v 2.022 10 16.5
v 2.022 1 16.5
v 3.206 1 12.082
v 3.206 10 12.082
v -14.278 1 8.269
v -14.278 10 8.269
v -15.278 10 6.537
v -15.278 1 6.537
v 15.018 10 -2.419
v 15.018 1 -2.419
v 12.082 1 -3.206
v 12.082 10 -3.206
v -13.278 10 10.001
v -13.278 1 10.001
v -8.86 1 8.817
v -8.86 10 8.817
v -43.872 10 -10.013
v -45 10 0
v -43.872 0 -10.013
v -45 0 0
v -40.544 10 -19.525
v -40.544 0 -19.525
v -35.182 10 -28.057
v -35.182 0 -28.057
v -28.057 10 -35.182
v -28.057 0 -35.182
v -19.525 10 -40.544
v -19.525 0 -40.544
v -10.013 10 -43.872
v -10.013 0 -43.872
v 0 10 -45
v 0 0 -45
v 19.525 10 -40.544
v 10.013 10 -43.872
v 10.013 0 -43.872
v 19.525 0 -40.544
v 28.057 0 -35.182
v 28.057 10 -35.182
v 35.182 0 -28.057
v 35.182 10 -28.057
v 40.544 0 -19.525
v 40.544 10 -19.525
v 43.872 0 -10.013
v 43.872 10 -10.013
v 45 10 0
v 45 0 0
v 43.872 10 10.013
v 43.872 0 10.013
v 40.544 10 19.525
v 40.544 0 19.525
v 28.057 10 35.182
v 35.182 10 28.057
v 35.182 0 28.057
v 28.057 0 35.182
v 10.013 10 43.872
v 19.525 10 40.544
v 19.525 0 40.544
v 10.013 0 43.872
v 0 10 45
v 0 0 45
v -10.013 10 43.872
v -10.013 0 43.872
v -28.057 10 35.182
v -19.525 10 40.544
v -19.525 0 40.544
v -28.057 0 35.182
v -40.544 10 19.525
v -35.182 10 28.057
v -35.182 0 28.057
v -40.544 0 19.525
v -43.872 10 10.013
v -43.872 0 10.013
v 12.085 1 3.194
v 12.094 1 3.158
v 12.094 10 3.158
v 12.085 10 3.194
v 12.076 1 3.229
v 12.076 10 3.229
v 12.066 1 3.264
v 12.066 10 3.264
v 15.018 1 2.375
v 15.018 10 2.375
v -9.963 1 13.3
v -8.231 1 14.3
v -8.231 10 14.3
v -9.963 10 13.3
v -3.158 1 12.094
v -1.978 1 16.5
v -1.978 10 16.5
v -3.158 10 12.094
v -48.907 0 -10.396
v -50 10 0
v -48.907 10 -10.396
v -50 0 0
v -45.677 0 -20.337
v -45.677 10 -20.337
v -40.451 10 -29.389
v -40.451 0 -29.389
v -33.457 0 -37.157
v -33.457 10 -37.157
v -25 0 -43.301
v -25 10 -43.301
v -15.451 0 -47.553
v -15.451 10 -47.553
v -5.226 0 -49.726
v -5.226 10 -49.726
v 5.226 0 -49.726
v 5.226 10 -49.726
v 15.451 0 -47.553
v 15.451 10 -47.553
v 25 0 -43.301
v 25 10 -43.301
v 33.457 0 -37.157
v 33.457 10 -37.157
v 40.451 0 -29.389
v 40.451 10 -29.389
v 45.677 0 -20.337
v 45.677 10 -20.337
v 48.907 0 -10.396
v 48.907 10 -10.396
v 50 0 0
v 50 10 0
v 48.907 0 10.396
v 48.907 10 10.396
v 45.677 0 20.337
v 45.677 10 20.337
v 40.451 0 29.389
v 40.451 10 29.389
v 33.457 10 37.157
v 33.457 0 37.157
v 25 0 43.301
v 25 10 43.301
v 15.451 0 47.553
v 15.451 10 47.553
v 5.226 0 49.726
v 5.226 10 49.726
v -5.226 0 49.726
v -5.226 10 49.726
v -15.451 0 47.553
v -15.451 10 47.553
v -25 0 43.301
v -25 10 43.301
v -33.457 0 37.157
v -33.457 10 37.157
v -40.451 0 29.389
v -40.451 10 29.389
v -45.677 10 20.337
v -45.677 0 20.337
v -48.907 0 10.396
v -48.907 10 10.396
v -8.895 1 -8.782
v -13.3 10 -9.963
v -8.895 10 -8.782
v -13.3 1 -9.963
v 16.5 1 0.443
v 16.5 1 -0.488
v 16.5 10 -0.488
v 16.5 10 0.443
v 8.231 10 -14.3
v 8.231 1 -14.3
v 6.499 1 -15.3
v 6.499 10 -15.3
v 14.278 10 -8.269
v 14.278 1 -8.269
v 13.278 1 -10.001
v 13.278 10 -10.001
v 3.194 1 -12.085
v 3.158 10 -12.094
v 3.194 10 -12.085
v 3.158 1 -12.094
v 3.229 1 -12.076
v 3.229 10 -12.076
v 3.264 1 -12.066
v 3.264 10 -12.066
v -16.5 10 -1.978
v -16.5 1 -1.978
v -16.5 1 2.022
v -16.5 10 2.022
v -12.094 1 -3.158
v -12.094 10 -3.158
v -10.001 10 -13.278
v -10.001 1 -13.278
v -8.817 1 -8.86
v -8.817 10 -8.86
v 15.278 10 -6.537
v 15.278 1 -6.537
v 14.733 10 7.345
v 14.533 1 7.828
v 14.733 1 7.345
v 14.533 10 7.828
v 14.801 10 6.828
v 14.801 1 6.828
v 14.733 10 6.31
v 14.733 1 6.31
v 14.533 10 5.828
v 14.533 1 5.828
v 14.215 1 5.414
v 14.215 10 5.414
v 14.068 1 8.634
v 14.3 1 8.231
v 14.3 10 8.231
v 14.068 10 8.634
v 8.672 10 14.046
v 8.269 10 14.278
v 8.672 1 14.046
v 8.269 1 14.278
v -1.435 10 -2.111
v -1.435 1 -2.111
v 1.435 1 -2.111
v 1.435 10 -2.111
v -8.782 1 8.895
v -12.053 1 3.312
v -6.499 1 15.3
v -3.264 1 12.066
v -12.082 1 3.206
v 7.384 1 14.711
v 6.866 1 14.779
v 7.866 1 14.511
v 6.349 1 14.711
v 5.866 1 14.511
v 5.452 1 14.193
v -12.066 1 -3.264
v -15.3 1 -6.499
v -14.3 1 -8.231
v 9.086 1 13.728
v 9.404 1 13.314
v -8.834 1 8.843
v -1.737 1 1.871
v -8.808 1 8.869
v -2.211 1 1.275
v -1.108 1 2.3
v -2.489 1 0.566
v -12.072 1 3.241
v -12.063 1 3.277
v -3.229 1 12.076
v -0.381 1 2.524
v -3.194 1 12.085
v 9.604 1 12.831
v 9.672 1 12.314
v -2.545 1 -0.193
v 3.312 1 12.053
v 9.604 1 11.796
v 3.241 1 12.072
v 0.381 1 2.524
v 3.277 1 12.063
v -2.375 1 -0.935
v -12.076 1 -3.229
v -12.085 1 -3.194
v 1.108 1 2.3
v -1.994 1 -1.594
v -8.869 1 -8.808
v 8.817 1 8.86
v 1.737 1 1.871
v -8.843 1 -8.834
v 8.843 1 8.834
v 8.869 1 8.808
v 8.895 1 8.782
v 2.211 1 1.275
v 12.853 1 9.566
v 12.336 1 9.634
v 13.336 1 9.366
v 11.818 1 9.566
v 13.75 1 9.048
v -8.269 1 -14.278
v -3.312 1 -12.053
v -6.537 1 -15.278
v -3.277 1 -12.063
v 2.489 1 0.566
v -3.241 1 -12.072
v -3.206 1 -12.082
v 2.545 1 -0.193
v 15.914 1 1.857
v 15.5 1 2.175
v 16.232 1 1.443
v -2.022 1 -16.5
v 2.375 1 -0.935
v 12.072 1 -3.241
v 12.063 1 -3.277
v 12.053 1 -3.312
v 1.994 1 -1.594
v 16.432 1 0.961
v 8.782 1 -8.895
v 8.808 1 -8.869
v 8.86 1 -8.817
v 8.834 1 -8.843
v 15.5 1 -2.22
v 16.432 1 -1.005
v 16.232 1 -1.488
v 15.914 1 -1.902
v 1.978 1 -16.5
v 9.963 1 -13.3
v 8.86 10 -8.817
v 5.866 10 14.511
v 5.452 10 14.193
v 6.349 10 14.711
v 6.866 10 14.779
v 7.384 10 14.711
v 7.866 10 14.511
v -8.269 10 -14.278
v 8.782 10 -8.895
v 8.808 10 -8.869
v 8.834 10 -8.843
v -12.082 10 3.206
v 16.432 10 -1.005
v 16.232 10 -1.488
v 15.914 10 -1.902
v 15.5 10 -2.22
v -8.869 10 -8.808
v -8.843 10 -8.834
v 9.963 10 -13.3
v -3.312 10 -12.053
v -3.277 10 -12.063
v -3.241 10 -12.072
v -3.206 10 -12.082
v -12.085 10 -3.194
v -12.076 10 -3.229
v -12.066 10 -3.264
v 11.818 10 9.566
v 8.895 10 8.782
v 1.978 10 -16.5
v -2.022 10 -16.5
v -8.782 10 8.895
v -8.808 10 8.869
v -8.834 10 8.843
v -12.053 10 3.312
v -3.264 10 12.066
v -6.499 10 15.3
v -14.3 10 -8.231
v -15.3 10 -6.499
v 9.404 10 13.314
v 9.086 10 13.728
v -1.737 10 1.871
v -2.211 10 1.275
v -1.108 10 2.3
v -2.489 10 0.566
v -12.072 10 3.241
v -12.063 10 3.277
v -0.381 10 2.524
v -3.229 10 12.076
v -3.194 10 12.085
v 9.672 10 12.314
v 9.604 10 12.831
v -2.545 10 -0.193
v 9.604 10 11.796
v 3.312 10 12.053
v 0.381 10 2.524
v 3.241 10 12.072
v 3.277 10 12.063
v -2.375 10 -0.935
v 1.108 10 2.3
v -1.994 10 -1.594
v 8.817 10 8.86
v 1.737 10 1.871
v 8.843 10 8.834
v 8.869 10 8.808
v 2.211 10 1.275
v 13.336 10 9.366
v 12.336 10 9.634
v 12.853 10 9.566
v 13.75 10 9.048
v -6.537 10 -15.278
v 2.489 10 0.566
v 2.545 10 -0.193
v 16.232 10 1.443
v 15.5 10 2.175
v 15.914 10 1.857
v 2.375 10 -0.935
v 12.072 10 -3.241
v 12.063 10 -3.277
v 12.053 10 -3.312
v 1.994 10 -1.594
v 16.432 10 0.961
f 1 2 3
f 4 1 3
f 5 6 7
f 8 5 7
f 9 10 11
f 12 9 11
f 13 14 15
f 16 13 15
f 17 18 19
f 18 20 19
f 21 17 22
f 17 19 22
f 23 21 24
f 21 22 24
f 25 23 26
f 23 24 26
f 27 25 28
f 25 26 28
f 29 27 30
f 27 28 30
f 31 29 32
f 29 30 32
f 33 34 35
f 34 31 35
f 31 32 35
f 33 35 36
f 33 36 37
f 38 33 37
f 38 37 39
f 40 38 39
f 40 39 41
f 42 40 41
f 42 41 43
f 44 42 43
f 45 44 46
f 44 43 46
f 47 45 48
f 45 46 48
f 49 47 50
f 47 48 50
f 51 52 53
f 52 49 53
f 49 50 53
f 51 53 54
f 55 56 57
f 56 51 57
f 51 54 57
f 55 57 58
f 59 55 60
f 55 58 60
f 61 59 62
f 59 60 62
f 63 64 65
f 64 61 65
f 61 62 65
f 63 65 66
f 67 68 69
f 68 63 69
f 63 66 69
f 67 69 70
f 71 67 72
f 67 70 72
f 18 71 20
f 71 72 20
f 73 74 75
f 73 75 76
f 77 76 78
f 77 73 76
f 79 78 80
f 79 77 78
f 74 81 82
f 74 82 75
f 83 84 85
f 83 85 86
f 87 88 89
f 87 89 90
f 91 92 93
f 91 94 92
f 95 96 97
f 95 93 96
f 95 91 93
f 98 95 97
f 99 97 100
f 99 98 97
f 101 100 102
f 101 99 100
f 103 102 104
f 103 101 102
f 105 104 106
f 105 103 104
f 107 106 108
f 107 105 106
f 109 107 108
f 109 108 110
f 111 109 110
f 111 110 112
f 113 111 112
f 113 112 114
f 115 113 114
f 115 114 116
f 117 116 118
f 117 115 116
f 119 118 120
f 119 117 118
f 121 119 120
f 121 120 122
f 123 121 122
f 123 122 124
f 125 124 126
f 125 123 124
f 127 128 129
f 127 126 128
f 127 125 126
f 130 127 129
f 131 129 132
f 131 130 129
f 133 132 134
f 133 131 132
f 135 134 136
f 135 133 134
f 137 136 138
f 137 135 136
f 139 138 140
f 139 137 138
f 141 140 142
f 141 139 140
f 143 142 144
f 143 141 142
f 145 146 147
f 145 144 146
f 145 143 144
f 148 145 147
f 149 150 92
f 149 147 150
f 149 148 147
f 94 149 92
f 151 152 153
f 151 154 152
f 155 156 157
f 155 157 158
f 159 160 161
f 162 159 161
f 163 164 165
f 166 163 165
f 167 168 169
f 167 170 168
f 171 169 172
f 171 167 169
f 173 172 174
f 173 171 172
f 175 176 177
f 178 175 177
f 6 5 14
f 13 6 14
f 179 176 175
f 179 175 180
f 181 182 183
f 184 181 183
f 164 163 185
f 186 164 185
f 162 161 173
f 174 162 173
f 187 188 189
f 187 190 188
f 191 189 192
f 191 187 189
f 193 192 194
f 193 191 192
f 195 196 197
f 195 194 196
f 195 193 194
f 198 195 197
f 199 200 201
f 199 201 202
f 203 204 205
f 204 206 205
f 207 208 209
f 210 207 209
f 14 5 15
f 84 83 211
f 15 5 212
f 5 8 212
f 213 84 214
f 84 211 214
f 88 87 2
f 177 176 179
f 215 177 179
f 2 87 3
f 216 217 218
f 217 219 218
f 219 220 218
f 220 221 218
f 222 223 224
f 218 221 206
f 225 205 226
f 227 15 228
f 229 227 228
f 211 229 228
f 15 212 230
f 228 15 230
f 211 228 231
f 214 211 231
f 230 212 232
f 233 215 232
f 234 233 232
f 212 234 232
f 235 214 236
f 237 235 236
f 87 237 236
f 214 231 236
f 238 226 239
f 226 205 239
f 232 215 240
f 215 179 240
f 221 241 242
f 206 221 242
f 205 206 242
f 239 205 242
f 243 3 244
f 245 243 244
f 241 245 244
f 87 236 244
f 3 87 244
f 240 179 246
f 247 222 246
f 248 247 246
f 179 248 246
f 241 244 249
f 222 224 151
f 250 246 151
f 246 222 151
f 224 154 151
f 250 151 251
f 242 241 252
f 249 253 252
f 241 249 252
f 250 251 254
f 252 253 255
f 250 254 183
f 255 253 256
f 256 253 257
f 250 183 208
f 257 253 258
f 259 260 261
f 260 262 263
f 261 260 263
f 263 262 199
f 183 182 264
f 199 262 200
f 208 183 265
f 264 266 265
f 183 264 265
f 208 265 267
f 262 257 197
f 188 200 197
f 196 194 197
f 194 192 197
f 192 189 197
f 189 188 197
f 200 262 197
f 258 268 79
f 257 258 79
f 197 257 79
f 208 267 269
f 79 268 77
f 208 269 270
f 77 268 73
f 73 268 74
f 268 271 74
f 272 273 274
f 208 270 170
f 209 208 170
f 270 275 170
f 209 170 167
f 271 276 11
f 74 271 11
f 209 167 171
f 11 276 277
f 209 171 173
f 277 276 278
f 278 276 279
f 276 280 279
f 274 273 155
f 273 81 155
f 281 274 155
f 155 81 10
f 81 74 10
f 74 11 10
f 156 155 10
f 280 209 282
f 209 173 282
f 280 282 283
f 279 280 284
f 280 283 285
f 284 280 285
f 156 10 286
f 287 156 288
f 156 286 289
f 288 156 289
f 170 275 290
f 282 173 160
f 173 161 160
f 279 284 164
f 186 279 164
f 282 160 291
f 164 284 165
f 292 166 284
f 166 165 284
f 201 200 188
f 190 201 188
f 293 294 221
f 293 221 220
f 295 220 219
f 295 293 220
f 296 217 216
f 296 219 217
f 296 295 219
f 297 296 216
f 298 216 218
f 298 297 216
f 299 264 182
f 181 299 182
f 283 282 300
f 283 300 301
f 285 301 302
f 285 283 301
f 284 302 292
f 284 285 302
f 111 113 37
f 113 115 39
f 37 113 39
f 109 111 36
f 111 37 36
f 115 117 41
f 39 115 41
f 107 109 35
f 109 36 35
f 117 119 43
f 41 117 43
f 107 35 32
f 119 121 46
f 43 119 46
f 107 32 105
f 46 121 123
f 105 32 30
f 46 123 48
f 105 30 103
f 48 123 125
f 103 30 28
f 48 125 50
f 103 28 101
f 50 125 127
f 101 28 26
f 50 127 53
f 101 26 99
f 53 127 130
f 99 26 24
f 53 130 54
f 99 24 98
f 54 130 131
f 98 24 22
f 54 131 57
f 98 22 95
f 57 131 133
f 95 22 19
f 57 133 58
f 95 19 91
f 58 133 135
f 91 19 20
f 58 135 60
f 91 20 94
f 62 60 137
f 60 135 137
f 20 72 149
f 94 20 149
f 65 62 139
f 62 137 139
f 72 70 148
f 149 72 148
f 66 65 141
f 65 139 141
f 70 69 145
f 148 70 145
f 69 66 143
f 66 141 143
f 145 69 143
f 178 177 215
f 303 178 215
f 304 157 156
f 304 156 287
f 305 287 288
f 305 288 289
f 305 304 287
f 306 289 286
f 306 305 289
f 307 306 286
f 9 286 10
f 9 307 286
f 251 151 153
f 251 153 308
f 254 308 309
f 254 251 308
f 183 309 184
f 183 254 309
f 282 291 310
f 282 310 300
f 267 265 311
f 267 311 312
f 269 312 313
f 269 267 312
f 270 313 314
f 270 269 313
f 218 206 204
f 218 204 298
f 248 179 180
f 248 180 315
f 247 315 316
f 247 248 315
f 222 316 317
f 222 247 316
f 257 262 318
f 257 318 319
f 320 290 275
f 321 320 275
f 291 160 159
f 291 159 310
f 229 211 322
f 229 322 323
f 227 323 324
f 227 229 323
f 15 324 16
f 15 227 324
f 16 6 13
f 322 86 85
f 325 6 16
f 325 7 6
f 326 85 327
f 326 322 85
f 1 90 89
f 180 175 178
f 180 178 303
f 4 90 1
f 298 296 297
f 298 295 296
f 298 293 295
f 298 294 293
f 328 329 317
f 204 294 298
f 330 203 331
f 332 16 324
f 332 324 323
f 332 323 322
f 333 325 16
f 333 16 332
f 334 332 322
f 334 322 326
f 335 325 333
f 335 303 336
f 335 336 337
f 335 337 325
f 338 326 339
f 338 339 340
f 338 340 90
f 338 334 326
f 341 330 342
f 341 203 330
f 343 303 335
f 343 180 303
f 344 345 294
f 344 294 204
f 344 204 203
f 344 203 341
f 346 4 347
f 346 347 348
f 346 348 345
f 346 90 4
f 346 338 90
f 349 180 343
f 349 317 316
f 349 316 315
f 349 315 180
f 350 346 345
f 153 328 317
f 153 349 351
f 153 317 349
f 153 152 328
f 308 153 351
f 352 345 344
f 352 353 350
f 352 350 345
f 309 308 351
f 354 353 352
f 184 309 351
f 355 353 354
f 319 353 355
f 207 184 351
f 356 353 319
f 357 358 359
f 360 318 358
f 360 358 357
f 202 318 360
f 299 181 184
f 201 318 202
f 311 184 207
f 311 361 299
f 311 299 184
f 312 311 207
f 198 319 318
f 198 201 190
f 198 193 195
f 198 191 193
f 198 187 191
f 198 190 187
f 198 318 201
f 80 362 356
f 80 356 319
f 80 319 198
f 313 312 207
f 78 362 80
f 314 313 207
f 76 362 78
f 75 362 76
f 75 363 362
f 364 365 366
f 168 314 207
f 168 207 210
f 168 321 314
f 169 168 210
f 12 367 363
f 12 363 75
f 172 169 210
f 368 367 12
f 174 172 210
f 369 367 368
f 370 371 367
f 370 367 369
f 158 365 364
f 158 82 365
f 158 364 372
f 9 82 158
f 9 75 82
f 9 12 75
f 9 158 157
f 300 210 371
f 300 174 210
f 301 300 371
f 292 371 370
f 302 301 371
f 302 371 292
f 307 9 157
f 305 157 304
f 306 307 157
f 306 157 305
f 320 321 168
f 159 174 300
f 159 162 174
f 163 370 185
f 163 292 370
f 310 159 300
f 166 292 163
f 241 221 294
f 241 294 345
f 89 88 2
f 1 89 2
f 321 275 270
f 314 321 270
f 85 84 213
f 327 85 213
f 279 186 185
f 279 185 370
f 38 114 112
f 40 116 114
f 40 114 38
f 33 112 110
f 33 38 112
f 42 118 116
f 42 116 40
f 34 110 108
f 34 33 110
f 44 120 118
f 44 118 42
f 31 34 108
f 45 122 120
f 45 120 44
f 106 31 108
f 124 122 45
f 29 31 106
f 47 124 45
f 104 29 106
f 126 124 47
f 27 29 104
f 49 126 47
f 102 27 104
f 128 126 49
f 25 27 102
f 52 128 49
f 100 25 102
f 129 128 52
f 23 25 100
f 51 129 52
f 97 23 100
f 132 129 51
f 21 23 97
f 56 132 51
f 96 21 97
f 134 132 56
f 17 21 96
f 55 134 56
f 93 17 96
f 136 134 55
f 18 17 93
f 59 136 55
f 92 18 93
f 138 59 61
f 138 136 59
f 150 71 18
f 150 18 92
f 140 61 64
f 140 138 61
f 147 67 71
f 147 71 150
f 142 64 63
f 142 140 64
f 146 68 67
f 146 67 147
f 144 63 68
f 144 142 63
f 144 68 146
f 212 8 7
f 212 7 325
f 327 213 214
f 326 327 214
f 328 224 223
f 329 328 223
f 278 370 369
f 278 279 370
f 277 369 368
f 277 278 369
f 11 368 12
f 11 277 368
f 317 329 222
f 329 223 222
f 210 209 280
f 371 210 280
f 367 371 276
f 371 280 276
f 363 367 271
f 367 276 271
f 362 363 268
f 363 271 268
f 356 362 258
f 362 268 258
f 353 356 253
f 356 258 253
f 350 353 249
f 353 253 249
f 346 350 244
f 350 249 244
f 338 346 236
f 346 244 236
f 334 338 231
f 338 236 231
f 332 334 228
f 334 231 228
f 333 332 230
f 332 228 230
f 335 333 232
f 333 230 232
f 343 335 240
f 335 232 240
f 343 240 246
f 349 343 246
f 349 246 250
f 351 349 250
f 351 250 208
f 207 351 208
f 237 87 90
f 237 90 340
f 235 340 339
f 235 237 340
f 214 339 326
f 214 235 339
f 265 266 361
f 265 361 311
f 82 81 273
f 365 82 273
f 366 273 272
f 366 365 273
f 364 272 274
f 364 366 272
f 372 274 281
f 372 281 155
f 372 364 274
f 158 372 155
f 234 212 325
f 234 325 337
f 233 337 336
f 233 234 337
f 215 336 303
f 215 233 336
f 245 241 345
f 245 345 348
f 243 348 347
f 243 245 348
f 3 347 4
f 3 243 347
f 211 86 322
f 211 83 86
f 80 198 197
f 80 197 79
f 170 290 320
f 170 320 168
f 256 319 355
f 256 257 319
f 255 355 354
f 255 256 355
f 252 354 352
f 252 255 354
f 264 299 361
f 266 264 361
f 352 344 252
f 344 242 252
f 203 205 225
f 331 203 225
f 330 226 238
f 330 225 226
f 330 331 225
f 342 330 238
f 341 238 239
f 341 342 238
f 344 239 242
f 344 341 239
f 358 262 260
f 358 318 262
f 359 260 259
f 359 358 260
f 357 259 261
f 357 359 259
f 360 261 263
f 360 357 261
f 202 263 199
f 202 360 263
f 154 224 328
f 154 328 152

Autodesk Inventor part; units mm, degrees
ref_plane "YZ Plane" through (0, 0, 0) normal (1, 0, 0) x (0, 1, 0)
ref_plane "XZ Plane" through (0, 0, 0) normal (0, 1, 0) x (-1, 0, 0)
ref_plane "XY Plane" through (0, 0, 0) normal (0, 0, 1) x (1, 0, 0)
sketch "Sketch1" plane through (0, 0, 0) normal (0, 1, 0) x (-1, 0, 0)
  circle A0 centre (0, 0) radius 45
  circle A1 centre (0, 0) radius 50
  dimension "d0" = 90
  dimension "d1" = 100
extrude "Extrusion1" add sketch "Sketch1" along normal blind 10
ref_plane "Work Plane1" through (0, 1, 0) normal (0, 1, 0) x (1, 0, 0)
sketch "Sketch2" plane through (0, 1, 0) normal (0, 1, 0) x (1, 0, 0)
  circle A0 centre (0, 0) radius 12.5
  line L0 (-12.5, -0.0222) -> (-16.5, -0.0222)
  line L1 (-16.5, -0.0222) -> (-16.5, 1.9778)
  line L2 (-16.5, 1.9778) -> (-12.0944, 3.1583)
  line L3 (-16.5, -0.0222) -> (-16.5, -2.0222)
  line L4 (-16.5, -2.0222) -> (-12.0819, -3.206)
  arc A1 (-12.0944, 3.1583) -> (-12.0819, -3.206) centre (0, 0) ccw
  line L5 (-10.8142, -6.2692) -> (-14.2783, -8.2692)
  line L6 (-14.2783, -8.2692) -> (-15.2783, -6.5372)
  line L7 (-15.2783, -6.5372) -> (-12.0532, -3.3121)
  line L8 (-14.2783, -8.2692) -> (-13.2783, -10.0013)
  line L9 (-13.2783, -10.0013) -> (-8.8602, -8.8174)
  arc A2 (-12.0532, -3.3121) -> (-8.8602, -8.8174) centre (0, 0) ccw
  line L10 (-6.2308, -10.8364) -> (-8.2308, -14.3005)
  line L11 (-8.2308, -14.3005) -> (-9.9628, -13.3005)
  line L12 (-9.9628, -13.3005) -> (-8.7823, -8.895)
  line L13 (-8.2308, -14.3005) -> (-6.4987, -15.3005)
  line L14 (-6.4987, -15.3005) -> (-3.2644, -12.0662)
  arc A3 (-8.7823, -8.895) -> (-3.2644, -12.0662) centre (0, 0) ccw
  line L15 (0.0222, -12.5) -> (0.0222, -16.5)
  line L16 (0.0222, -16.5) -> (-1.9778, -16.5)
  line L17 (-1.9778, -16.5) -> (-3.1583, -12.0944)
  line L18 (0.0222, -16.5) -> (2.0222, -16.5)
  line L19 (2.0222, -16.5) -> (3.206, -12.0819)
  arc A4 (-3.1583, -12.0944) -> (3.206, -12.0819) centre (0, 0) ccw
  line L20 (6.2692, -10.8142) -> (8.2692, -14.2783)
  line L21 (8.2692, -14.2783) -> (6.5372, -15.2783)
  line L22 (6.5372, -15.2783) -> (3.3121, -12.0532)
  line L23 (8.2692, -14.2783) -> (10.0013, -13.2783)
  line L24 (10.0013, -13.2783) -> (8.8174, -8.8602)
  arc A5 (3.3121, -12.0532) -> (8.8174, -8.8602) centre (0, 0) ccw
  line L25 (10.8364, -6.2308) -> (14.3005, -8.2308)
  line L26 (14.3005, -8.2308) -> (13.3005, -9.9628)
  line L27 (13.3005, -9.9628) -> (8.895, -8.7823)
  line L28 (14.3005, -8.2308) -> (15.3005, -6.4987)
  line L29 (15.3005, -6.4987) -> (12.0662, -3.2644)
  arc A6 (8.895, -8.7823) -> (12.0662, -3.2644) centre (0, 0) ccw
  line L30 (12.5, 0.0222) -> (16.5, 0.0222)
  line L31 (16.5, 0.0222) -> (16.5, -1.9778)
  line L32 (16.5, -1.9778) -> (12.0944, -3.1583)
  line L33 (16.5, 0.0222) -> (16.5, 2.0222)
  line L34 (16.5, 2.0222) -> (12.0819, 3.206)
  arc A7 (12.0944, -3.1583) -> (12.0819, 3.206) centre (0, 0) ccw
  line L35 (10.8142, 6.2692) -> (14.2783, 8.2692)
  line L36 (14.2783, 8.2692) -> (15.2783, 6.5372)
  line L37 (15.2783, 6.5372) -> (12.0532, 3.3121)
  line L38 (14.2783, 8.2692) -> (13.2783, 10.0013)
  line L39 (13.2783, 10.0013) -> (8.8602, 8.8174)
  arc A8 (12.0532, 3.3121) -> (8.8602, 8.8174) centre (0, 0) ccw
  line L40 (6.2308, 10.8364) -> (8.2308, 14.3005)
  line L41 (8.2308, 14.3005) -> (9.9628, 13.3005)
  line L42 (9.9628, 13.3005) -> (8.7823, 8.895)
  line L43 (8.2308, 14.3005) -> (6.4987, 15.3005)
  line L44 (6.4987, 15.3005) -> (3.2644, 12.0662)
  arc A9 (8.7823, 8.895) -> (3.2644, 12.0662) centre (0, 0) ccw
  line L45 (-0.0222, 12.5) -> (-0.0222, 16.5)
  line L46 (-0.0222, 16.5) -> (1.9778, 16.5)
  line L47 (1.9778, 16.5) -> (3.1583, 12.0944)
  line L48 (-0.0222, 16.5) -> (-2.0222, 16.5)
  line L49 (-2.0222, 16.5) -> (-3.206, 12.0819)
  arc A10 (3.1583, 12.0944) -> (-3.206, 12.0819) centre (0, 0) ccw
  line L50 (-6.2692, 10.8142) -> (-8.2692, 14.2783)
  line L51 (-8.2692, 14.2783) -> (-6.5372, 15.2783)
  line L52 (-6.5372, 15.2783) -> (-3.3121, 12.0532)
  line L53 (-8.2692, 14.2783) -> (-10.0013, 13.2783)
  line L54 (-10.0013, 13.2783) -> (-8.8174, 8.8602)
  arc A11 (-3.3121, 12.0532) -> (-8.8174, 8.8602) centre (0, 0) ccw
  line L55 (-10.8364, 6.2308) -> (-14.3005, 8.2308)
  line L56 (-14.3005, 8.2308) -> (-13.3005, 9.9628)
  line L57 (-13.3005, 9.9628) -> (-8.895, 8.7823)
  line L58 (-14.3005, 8.2308) -> (-15.3005, 6.4987)
  line L59 (-15.3005, 6.4987) -> (-12.0662, 3.2644)
  arc A12 (-8.895, 8.7823) -> (-12.0662, 3.2644) centre (0, 0) ccw
  circle A13 centre (0, 0) radius 2.5527
  line L60 (-1.4351, 2.1111) -> (1.4351, 2.1111)
  dimension "d5" = 25
  dimension "d6" = 105
  dimension "d7" = 105
  dimension "d8" = 2
  dimension "d9" = 2
  dimension "d10" = 4
  dimension "d13" = 360
  dimension "d17" = 5.1054
  dimension "d18" = 2.8702
extrude "Extrusion2" add sketch "Sketch2" along normal blind 9 contours A0 | A0 L30 L31 L32 | A0 L34 L33 L30 | L29 L28 L25 A0 | A0 L35 L36 L37 | L25 L26 L27 A0 | A0 L39 L38 L35 | L24 L23 L20 A0 | A0 L40 L41 L42 | L20 L21 L22 A0 | A0 L44 L43 L40 | L19 L18 L15 A0 | A0 L45 L46 L47 | L15 L16 L17 A0 | A0 L49 L48 L45 | L14 L13 L10 A0 | A0 L50 L51 L52 | L10 L11 L12 A0 | A0 L54 L53 L50 | L9 L8 L5 A0 | A0 L55 L56 L57 | L5 L6 L7 A0 | A0 L59 L58 L55 | L4 L3 L0 A0 | A0 L0 L1 L2 | L60 A13 picked at (-0.1014, 2.2522)
fillet "Fillet3" radius 2 2 edges at (16.5, 5.5, 1.9778) (16.5, 5.5, -2.0222)
fillet "Fillet4" radius 2 4 edges at (13.3005, 5.5, 9.9628) (15.3005, 5.5, 6.4987) (10.0013, 5.5, 13.2783) (6.5372, 5.5, 15.2783)
equation "\"d8\" = d9"
properties part number "ringGEAR"
